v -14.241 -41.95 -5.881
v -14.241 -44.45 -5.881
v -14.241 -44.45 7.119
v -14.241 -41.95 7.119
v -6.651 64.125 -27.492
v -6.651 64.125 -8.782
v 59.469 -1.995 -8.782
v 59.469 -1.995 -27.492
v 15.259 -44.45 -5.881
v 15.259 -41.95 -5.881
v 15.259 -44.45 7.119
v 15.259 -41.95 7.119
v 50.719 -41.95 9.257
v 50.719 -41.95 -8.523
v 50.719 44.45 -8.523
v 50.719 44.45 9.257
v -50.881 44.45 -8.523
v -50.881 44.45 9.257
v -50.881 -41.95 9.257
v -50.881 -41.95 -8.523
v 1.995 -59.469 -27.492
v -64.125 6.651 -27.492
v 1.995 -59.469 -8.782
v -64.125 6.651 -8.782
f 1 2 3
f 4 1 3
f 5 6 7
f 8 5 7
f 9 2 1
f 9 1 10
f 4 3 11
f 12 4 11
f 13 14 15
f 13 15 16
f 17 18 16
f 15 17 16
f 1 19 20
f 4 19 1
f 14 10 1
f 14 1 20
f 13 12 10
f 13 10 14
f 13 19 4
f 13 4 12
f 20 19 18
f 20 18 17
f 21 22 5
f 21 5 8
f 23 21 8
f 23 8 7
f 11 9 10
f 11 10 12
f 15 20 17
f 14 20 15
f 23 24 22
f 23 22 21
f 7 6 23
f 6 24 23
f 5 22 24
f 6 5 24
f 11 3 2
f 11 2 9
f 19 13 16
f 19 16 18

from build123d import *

# Parameters (mm, degrees)
F1_DEPTH = 44.45
F2_W     = 101.6
F2_H     = 17.78
F2_W_2   = 29.5
F2_H_2   = 13
F3_DEPTH = 2.5
F5_W     = 93.507964164
F5_H     = 18.709667027
F6_DEPTH = 40.64


with BuildPart() as f1:
    # F0 (on Front) → F1 (new body, symmetric)
    with BuildSketch(Plane.XZ):
        Polygon((50.7192363203, 9.257473639), (-50.8807636797, 9.257473639), (-50.8807636797, -8.522526361), (0, -8.522526361), (50.7192363203, -8.522526361), align=None)
    extrude(amount=F1_DEPTH, both=True)

    # F2 (on face) → F3 (cut, symmetric)
    with BuildSketch(Plane.XZ.offset(44.45)):
        with Locations((-0.0807636797, 0.367473639)):
            Rectangle(F2_W, F2_H)
        with Locations((0.5088085309, 0.618605656)):
            Rectangle(F2_W_2, F2_H_2, mode=Mode.SUBTRACT)
    extrude(amount=F3_DEPTH, both=True, mode=Mode.SUBTRACT)


with BuildPart() as f6:
    # F5 (on face) → F6 (new body, symmetric)
    with BuildSketch(Plane(origin=(0, 0, 0), x_dir=(0.7071067812, -0.7071067812, 0), z_dir=(-0.7071067812, -0.7071067812, 0))):
        with Locations((-3.2921414822, -18.1370964274)):
            Rectangle(F5_W, F5_H)
    extrude(amount=F6_DEPTH, both=True)


solid = Compound([f1.part, f6.part])
